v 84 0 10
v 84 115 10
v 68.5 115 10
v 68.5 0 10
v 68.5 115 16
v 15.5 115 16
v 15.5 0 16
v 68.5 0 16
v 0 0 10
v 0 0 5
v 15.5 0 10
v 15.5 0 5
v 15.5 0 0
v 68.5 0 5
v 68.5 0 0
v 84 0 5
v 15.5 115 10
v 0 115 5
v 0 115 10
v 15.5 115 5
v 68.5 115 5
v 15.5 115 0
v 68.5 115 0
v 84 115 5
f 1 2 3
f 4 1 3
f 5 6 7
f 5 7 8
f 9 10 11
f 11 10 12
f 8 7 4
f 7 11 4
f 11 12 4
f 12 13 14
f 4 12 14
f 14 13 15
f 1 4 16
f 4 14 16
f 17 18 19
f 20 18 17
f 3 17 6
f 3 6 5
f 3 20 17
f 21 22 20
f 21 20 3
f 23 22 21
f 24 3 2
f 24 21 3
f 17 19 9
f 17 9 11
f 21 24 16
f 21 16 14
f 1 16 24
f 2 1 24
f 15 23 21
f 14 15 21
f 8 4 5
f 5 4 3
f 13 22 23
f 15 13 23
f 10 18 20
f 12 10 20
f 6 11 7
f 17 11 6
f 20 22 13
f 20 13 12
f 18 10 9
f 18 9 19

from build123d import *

# Parameters (mm, degrees)
SKETCH2_W               = 84
SKETCH2_H               = 115
BOSS_EXTRUDE1_DEPTH     = 15
SKETCH3_W               = 15.5
SKETCH3_H               = 5
CUT_EXTRUDE1_DEPTH      = 144.199162009
MIRROR2_COPY_1_SKETCH_W = 15.5
MIRROR2_COPY_1_SKETCH_H = 5
MIRROR2_COPY_1_DEPTH    = 144.199162009
MIRROR2_COPY_2_SKETCH_W = 15.5
MIRROR2_COPY_2_SKETCH_H = 5
MIRROR2_COPY_2_DEPTH    = 144.199162009
SKETCH4_W               = 53
SKETCH4_H               = 115
BOSS_EXTRUDE2_DEPTH     = 1


with BuildPart() as part:
    # Sketch2 → Boss-Extrude1 (new body)
    with BuildSketch(Plane.XY):
        with Locations((42, 57.5)):
            Rectangle(SKETCH2_W, SKETCH2_H)
    extrude(amount=BOSS_EXTRUDE1_DEPTH)

    # Sketch3 → Cut-Extrude1 (cut, through all)
    with BuildSketch(Plane(origin=(0, 115, 0), x_dir=(1, 0, 0), z_dir=(0, 1, 0))):
        with Locations((7.75, -12.5)):
            Rectangle(SKETCH3_W, SKETCH3_H)
    cut_extrude1 = extrude(amount=-CUT_EXTRUDE1_DEPTH, mode=Mode.SUBTRACT)

    # Mirror1: Cut-Extrude1 across plane
    add(cut_extrude1.mirror(Plane.XY.offset(7.5)), mode=Mode.SUBTRACT)

    # Mirror2 copy 1 sketch → Mirror2 copy 1 (cut, through all)
    with BuildSketch(Plane(origin=(84, 115, 15), x_dir=(-1, 0, 0), z_dir=(0, 1, 0))):
        with Locations((7.75, -12.5)):
            Rectangle(MIRROR2_COPY_1_SKETCH_W, MIRROR2_COPY_1_SKETCH_H)
    extrude(amount=-MIRROR2_COPY_1_DEPTH, mode=Mode.SUBTRACT)

    # Mirror2 copy 2 sketch → Mirror2 copy 2 (cut, through all)
    with BuildSketch(Plane(origin=(84, 115, 0), x_dir=(-1, 0, 0), z_dir=(0, 1, 0))):
        with Locations((7.75, 12.5)):
            Rectangle(MIRROR2_COPY_2_SKETCH_W, MIRROR2_COPY_2_SKETCH_H)
    extrude(amount=-MIRROR2_COPY_2_DEPTH, mode=Mode.SUBTRACT)

    # Sketch4 → Boss-Extrude2 (add)
    with BuildSketch(Plane.XY.offset(15)):
        with Locations((42, 57.5)):
            Rectangle(SKETCH4_W, SKETCH4_H)
    extrude(amount=BOSS_EXTRUDE2_DEPTH)


solid = part.part
